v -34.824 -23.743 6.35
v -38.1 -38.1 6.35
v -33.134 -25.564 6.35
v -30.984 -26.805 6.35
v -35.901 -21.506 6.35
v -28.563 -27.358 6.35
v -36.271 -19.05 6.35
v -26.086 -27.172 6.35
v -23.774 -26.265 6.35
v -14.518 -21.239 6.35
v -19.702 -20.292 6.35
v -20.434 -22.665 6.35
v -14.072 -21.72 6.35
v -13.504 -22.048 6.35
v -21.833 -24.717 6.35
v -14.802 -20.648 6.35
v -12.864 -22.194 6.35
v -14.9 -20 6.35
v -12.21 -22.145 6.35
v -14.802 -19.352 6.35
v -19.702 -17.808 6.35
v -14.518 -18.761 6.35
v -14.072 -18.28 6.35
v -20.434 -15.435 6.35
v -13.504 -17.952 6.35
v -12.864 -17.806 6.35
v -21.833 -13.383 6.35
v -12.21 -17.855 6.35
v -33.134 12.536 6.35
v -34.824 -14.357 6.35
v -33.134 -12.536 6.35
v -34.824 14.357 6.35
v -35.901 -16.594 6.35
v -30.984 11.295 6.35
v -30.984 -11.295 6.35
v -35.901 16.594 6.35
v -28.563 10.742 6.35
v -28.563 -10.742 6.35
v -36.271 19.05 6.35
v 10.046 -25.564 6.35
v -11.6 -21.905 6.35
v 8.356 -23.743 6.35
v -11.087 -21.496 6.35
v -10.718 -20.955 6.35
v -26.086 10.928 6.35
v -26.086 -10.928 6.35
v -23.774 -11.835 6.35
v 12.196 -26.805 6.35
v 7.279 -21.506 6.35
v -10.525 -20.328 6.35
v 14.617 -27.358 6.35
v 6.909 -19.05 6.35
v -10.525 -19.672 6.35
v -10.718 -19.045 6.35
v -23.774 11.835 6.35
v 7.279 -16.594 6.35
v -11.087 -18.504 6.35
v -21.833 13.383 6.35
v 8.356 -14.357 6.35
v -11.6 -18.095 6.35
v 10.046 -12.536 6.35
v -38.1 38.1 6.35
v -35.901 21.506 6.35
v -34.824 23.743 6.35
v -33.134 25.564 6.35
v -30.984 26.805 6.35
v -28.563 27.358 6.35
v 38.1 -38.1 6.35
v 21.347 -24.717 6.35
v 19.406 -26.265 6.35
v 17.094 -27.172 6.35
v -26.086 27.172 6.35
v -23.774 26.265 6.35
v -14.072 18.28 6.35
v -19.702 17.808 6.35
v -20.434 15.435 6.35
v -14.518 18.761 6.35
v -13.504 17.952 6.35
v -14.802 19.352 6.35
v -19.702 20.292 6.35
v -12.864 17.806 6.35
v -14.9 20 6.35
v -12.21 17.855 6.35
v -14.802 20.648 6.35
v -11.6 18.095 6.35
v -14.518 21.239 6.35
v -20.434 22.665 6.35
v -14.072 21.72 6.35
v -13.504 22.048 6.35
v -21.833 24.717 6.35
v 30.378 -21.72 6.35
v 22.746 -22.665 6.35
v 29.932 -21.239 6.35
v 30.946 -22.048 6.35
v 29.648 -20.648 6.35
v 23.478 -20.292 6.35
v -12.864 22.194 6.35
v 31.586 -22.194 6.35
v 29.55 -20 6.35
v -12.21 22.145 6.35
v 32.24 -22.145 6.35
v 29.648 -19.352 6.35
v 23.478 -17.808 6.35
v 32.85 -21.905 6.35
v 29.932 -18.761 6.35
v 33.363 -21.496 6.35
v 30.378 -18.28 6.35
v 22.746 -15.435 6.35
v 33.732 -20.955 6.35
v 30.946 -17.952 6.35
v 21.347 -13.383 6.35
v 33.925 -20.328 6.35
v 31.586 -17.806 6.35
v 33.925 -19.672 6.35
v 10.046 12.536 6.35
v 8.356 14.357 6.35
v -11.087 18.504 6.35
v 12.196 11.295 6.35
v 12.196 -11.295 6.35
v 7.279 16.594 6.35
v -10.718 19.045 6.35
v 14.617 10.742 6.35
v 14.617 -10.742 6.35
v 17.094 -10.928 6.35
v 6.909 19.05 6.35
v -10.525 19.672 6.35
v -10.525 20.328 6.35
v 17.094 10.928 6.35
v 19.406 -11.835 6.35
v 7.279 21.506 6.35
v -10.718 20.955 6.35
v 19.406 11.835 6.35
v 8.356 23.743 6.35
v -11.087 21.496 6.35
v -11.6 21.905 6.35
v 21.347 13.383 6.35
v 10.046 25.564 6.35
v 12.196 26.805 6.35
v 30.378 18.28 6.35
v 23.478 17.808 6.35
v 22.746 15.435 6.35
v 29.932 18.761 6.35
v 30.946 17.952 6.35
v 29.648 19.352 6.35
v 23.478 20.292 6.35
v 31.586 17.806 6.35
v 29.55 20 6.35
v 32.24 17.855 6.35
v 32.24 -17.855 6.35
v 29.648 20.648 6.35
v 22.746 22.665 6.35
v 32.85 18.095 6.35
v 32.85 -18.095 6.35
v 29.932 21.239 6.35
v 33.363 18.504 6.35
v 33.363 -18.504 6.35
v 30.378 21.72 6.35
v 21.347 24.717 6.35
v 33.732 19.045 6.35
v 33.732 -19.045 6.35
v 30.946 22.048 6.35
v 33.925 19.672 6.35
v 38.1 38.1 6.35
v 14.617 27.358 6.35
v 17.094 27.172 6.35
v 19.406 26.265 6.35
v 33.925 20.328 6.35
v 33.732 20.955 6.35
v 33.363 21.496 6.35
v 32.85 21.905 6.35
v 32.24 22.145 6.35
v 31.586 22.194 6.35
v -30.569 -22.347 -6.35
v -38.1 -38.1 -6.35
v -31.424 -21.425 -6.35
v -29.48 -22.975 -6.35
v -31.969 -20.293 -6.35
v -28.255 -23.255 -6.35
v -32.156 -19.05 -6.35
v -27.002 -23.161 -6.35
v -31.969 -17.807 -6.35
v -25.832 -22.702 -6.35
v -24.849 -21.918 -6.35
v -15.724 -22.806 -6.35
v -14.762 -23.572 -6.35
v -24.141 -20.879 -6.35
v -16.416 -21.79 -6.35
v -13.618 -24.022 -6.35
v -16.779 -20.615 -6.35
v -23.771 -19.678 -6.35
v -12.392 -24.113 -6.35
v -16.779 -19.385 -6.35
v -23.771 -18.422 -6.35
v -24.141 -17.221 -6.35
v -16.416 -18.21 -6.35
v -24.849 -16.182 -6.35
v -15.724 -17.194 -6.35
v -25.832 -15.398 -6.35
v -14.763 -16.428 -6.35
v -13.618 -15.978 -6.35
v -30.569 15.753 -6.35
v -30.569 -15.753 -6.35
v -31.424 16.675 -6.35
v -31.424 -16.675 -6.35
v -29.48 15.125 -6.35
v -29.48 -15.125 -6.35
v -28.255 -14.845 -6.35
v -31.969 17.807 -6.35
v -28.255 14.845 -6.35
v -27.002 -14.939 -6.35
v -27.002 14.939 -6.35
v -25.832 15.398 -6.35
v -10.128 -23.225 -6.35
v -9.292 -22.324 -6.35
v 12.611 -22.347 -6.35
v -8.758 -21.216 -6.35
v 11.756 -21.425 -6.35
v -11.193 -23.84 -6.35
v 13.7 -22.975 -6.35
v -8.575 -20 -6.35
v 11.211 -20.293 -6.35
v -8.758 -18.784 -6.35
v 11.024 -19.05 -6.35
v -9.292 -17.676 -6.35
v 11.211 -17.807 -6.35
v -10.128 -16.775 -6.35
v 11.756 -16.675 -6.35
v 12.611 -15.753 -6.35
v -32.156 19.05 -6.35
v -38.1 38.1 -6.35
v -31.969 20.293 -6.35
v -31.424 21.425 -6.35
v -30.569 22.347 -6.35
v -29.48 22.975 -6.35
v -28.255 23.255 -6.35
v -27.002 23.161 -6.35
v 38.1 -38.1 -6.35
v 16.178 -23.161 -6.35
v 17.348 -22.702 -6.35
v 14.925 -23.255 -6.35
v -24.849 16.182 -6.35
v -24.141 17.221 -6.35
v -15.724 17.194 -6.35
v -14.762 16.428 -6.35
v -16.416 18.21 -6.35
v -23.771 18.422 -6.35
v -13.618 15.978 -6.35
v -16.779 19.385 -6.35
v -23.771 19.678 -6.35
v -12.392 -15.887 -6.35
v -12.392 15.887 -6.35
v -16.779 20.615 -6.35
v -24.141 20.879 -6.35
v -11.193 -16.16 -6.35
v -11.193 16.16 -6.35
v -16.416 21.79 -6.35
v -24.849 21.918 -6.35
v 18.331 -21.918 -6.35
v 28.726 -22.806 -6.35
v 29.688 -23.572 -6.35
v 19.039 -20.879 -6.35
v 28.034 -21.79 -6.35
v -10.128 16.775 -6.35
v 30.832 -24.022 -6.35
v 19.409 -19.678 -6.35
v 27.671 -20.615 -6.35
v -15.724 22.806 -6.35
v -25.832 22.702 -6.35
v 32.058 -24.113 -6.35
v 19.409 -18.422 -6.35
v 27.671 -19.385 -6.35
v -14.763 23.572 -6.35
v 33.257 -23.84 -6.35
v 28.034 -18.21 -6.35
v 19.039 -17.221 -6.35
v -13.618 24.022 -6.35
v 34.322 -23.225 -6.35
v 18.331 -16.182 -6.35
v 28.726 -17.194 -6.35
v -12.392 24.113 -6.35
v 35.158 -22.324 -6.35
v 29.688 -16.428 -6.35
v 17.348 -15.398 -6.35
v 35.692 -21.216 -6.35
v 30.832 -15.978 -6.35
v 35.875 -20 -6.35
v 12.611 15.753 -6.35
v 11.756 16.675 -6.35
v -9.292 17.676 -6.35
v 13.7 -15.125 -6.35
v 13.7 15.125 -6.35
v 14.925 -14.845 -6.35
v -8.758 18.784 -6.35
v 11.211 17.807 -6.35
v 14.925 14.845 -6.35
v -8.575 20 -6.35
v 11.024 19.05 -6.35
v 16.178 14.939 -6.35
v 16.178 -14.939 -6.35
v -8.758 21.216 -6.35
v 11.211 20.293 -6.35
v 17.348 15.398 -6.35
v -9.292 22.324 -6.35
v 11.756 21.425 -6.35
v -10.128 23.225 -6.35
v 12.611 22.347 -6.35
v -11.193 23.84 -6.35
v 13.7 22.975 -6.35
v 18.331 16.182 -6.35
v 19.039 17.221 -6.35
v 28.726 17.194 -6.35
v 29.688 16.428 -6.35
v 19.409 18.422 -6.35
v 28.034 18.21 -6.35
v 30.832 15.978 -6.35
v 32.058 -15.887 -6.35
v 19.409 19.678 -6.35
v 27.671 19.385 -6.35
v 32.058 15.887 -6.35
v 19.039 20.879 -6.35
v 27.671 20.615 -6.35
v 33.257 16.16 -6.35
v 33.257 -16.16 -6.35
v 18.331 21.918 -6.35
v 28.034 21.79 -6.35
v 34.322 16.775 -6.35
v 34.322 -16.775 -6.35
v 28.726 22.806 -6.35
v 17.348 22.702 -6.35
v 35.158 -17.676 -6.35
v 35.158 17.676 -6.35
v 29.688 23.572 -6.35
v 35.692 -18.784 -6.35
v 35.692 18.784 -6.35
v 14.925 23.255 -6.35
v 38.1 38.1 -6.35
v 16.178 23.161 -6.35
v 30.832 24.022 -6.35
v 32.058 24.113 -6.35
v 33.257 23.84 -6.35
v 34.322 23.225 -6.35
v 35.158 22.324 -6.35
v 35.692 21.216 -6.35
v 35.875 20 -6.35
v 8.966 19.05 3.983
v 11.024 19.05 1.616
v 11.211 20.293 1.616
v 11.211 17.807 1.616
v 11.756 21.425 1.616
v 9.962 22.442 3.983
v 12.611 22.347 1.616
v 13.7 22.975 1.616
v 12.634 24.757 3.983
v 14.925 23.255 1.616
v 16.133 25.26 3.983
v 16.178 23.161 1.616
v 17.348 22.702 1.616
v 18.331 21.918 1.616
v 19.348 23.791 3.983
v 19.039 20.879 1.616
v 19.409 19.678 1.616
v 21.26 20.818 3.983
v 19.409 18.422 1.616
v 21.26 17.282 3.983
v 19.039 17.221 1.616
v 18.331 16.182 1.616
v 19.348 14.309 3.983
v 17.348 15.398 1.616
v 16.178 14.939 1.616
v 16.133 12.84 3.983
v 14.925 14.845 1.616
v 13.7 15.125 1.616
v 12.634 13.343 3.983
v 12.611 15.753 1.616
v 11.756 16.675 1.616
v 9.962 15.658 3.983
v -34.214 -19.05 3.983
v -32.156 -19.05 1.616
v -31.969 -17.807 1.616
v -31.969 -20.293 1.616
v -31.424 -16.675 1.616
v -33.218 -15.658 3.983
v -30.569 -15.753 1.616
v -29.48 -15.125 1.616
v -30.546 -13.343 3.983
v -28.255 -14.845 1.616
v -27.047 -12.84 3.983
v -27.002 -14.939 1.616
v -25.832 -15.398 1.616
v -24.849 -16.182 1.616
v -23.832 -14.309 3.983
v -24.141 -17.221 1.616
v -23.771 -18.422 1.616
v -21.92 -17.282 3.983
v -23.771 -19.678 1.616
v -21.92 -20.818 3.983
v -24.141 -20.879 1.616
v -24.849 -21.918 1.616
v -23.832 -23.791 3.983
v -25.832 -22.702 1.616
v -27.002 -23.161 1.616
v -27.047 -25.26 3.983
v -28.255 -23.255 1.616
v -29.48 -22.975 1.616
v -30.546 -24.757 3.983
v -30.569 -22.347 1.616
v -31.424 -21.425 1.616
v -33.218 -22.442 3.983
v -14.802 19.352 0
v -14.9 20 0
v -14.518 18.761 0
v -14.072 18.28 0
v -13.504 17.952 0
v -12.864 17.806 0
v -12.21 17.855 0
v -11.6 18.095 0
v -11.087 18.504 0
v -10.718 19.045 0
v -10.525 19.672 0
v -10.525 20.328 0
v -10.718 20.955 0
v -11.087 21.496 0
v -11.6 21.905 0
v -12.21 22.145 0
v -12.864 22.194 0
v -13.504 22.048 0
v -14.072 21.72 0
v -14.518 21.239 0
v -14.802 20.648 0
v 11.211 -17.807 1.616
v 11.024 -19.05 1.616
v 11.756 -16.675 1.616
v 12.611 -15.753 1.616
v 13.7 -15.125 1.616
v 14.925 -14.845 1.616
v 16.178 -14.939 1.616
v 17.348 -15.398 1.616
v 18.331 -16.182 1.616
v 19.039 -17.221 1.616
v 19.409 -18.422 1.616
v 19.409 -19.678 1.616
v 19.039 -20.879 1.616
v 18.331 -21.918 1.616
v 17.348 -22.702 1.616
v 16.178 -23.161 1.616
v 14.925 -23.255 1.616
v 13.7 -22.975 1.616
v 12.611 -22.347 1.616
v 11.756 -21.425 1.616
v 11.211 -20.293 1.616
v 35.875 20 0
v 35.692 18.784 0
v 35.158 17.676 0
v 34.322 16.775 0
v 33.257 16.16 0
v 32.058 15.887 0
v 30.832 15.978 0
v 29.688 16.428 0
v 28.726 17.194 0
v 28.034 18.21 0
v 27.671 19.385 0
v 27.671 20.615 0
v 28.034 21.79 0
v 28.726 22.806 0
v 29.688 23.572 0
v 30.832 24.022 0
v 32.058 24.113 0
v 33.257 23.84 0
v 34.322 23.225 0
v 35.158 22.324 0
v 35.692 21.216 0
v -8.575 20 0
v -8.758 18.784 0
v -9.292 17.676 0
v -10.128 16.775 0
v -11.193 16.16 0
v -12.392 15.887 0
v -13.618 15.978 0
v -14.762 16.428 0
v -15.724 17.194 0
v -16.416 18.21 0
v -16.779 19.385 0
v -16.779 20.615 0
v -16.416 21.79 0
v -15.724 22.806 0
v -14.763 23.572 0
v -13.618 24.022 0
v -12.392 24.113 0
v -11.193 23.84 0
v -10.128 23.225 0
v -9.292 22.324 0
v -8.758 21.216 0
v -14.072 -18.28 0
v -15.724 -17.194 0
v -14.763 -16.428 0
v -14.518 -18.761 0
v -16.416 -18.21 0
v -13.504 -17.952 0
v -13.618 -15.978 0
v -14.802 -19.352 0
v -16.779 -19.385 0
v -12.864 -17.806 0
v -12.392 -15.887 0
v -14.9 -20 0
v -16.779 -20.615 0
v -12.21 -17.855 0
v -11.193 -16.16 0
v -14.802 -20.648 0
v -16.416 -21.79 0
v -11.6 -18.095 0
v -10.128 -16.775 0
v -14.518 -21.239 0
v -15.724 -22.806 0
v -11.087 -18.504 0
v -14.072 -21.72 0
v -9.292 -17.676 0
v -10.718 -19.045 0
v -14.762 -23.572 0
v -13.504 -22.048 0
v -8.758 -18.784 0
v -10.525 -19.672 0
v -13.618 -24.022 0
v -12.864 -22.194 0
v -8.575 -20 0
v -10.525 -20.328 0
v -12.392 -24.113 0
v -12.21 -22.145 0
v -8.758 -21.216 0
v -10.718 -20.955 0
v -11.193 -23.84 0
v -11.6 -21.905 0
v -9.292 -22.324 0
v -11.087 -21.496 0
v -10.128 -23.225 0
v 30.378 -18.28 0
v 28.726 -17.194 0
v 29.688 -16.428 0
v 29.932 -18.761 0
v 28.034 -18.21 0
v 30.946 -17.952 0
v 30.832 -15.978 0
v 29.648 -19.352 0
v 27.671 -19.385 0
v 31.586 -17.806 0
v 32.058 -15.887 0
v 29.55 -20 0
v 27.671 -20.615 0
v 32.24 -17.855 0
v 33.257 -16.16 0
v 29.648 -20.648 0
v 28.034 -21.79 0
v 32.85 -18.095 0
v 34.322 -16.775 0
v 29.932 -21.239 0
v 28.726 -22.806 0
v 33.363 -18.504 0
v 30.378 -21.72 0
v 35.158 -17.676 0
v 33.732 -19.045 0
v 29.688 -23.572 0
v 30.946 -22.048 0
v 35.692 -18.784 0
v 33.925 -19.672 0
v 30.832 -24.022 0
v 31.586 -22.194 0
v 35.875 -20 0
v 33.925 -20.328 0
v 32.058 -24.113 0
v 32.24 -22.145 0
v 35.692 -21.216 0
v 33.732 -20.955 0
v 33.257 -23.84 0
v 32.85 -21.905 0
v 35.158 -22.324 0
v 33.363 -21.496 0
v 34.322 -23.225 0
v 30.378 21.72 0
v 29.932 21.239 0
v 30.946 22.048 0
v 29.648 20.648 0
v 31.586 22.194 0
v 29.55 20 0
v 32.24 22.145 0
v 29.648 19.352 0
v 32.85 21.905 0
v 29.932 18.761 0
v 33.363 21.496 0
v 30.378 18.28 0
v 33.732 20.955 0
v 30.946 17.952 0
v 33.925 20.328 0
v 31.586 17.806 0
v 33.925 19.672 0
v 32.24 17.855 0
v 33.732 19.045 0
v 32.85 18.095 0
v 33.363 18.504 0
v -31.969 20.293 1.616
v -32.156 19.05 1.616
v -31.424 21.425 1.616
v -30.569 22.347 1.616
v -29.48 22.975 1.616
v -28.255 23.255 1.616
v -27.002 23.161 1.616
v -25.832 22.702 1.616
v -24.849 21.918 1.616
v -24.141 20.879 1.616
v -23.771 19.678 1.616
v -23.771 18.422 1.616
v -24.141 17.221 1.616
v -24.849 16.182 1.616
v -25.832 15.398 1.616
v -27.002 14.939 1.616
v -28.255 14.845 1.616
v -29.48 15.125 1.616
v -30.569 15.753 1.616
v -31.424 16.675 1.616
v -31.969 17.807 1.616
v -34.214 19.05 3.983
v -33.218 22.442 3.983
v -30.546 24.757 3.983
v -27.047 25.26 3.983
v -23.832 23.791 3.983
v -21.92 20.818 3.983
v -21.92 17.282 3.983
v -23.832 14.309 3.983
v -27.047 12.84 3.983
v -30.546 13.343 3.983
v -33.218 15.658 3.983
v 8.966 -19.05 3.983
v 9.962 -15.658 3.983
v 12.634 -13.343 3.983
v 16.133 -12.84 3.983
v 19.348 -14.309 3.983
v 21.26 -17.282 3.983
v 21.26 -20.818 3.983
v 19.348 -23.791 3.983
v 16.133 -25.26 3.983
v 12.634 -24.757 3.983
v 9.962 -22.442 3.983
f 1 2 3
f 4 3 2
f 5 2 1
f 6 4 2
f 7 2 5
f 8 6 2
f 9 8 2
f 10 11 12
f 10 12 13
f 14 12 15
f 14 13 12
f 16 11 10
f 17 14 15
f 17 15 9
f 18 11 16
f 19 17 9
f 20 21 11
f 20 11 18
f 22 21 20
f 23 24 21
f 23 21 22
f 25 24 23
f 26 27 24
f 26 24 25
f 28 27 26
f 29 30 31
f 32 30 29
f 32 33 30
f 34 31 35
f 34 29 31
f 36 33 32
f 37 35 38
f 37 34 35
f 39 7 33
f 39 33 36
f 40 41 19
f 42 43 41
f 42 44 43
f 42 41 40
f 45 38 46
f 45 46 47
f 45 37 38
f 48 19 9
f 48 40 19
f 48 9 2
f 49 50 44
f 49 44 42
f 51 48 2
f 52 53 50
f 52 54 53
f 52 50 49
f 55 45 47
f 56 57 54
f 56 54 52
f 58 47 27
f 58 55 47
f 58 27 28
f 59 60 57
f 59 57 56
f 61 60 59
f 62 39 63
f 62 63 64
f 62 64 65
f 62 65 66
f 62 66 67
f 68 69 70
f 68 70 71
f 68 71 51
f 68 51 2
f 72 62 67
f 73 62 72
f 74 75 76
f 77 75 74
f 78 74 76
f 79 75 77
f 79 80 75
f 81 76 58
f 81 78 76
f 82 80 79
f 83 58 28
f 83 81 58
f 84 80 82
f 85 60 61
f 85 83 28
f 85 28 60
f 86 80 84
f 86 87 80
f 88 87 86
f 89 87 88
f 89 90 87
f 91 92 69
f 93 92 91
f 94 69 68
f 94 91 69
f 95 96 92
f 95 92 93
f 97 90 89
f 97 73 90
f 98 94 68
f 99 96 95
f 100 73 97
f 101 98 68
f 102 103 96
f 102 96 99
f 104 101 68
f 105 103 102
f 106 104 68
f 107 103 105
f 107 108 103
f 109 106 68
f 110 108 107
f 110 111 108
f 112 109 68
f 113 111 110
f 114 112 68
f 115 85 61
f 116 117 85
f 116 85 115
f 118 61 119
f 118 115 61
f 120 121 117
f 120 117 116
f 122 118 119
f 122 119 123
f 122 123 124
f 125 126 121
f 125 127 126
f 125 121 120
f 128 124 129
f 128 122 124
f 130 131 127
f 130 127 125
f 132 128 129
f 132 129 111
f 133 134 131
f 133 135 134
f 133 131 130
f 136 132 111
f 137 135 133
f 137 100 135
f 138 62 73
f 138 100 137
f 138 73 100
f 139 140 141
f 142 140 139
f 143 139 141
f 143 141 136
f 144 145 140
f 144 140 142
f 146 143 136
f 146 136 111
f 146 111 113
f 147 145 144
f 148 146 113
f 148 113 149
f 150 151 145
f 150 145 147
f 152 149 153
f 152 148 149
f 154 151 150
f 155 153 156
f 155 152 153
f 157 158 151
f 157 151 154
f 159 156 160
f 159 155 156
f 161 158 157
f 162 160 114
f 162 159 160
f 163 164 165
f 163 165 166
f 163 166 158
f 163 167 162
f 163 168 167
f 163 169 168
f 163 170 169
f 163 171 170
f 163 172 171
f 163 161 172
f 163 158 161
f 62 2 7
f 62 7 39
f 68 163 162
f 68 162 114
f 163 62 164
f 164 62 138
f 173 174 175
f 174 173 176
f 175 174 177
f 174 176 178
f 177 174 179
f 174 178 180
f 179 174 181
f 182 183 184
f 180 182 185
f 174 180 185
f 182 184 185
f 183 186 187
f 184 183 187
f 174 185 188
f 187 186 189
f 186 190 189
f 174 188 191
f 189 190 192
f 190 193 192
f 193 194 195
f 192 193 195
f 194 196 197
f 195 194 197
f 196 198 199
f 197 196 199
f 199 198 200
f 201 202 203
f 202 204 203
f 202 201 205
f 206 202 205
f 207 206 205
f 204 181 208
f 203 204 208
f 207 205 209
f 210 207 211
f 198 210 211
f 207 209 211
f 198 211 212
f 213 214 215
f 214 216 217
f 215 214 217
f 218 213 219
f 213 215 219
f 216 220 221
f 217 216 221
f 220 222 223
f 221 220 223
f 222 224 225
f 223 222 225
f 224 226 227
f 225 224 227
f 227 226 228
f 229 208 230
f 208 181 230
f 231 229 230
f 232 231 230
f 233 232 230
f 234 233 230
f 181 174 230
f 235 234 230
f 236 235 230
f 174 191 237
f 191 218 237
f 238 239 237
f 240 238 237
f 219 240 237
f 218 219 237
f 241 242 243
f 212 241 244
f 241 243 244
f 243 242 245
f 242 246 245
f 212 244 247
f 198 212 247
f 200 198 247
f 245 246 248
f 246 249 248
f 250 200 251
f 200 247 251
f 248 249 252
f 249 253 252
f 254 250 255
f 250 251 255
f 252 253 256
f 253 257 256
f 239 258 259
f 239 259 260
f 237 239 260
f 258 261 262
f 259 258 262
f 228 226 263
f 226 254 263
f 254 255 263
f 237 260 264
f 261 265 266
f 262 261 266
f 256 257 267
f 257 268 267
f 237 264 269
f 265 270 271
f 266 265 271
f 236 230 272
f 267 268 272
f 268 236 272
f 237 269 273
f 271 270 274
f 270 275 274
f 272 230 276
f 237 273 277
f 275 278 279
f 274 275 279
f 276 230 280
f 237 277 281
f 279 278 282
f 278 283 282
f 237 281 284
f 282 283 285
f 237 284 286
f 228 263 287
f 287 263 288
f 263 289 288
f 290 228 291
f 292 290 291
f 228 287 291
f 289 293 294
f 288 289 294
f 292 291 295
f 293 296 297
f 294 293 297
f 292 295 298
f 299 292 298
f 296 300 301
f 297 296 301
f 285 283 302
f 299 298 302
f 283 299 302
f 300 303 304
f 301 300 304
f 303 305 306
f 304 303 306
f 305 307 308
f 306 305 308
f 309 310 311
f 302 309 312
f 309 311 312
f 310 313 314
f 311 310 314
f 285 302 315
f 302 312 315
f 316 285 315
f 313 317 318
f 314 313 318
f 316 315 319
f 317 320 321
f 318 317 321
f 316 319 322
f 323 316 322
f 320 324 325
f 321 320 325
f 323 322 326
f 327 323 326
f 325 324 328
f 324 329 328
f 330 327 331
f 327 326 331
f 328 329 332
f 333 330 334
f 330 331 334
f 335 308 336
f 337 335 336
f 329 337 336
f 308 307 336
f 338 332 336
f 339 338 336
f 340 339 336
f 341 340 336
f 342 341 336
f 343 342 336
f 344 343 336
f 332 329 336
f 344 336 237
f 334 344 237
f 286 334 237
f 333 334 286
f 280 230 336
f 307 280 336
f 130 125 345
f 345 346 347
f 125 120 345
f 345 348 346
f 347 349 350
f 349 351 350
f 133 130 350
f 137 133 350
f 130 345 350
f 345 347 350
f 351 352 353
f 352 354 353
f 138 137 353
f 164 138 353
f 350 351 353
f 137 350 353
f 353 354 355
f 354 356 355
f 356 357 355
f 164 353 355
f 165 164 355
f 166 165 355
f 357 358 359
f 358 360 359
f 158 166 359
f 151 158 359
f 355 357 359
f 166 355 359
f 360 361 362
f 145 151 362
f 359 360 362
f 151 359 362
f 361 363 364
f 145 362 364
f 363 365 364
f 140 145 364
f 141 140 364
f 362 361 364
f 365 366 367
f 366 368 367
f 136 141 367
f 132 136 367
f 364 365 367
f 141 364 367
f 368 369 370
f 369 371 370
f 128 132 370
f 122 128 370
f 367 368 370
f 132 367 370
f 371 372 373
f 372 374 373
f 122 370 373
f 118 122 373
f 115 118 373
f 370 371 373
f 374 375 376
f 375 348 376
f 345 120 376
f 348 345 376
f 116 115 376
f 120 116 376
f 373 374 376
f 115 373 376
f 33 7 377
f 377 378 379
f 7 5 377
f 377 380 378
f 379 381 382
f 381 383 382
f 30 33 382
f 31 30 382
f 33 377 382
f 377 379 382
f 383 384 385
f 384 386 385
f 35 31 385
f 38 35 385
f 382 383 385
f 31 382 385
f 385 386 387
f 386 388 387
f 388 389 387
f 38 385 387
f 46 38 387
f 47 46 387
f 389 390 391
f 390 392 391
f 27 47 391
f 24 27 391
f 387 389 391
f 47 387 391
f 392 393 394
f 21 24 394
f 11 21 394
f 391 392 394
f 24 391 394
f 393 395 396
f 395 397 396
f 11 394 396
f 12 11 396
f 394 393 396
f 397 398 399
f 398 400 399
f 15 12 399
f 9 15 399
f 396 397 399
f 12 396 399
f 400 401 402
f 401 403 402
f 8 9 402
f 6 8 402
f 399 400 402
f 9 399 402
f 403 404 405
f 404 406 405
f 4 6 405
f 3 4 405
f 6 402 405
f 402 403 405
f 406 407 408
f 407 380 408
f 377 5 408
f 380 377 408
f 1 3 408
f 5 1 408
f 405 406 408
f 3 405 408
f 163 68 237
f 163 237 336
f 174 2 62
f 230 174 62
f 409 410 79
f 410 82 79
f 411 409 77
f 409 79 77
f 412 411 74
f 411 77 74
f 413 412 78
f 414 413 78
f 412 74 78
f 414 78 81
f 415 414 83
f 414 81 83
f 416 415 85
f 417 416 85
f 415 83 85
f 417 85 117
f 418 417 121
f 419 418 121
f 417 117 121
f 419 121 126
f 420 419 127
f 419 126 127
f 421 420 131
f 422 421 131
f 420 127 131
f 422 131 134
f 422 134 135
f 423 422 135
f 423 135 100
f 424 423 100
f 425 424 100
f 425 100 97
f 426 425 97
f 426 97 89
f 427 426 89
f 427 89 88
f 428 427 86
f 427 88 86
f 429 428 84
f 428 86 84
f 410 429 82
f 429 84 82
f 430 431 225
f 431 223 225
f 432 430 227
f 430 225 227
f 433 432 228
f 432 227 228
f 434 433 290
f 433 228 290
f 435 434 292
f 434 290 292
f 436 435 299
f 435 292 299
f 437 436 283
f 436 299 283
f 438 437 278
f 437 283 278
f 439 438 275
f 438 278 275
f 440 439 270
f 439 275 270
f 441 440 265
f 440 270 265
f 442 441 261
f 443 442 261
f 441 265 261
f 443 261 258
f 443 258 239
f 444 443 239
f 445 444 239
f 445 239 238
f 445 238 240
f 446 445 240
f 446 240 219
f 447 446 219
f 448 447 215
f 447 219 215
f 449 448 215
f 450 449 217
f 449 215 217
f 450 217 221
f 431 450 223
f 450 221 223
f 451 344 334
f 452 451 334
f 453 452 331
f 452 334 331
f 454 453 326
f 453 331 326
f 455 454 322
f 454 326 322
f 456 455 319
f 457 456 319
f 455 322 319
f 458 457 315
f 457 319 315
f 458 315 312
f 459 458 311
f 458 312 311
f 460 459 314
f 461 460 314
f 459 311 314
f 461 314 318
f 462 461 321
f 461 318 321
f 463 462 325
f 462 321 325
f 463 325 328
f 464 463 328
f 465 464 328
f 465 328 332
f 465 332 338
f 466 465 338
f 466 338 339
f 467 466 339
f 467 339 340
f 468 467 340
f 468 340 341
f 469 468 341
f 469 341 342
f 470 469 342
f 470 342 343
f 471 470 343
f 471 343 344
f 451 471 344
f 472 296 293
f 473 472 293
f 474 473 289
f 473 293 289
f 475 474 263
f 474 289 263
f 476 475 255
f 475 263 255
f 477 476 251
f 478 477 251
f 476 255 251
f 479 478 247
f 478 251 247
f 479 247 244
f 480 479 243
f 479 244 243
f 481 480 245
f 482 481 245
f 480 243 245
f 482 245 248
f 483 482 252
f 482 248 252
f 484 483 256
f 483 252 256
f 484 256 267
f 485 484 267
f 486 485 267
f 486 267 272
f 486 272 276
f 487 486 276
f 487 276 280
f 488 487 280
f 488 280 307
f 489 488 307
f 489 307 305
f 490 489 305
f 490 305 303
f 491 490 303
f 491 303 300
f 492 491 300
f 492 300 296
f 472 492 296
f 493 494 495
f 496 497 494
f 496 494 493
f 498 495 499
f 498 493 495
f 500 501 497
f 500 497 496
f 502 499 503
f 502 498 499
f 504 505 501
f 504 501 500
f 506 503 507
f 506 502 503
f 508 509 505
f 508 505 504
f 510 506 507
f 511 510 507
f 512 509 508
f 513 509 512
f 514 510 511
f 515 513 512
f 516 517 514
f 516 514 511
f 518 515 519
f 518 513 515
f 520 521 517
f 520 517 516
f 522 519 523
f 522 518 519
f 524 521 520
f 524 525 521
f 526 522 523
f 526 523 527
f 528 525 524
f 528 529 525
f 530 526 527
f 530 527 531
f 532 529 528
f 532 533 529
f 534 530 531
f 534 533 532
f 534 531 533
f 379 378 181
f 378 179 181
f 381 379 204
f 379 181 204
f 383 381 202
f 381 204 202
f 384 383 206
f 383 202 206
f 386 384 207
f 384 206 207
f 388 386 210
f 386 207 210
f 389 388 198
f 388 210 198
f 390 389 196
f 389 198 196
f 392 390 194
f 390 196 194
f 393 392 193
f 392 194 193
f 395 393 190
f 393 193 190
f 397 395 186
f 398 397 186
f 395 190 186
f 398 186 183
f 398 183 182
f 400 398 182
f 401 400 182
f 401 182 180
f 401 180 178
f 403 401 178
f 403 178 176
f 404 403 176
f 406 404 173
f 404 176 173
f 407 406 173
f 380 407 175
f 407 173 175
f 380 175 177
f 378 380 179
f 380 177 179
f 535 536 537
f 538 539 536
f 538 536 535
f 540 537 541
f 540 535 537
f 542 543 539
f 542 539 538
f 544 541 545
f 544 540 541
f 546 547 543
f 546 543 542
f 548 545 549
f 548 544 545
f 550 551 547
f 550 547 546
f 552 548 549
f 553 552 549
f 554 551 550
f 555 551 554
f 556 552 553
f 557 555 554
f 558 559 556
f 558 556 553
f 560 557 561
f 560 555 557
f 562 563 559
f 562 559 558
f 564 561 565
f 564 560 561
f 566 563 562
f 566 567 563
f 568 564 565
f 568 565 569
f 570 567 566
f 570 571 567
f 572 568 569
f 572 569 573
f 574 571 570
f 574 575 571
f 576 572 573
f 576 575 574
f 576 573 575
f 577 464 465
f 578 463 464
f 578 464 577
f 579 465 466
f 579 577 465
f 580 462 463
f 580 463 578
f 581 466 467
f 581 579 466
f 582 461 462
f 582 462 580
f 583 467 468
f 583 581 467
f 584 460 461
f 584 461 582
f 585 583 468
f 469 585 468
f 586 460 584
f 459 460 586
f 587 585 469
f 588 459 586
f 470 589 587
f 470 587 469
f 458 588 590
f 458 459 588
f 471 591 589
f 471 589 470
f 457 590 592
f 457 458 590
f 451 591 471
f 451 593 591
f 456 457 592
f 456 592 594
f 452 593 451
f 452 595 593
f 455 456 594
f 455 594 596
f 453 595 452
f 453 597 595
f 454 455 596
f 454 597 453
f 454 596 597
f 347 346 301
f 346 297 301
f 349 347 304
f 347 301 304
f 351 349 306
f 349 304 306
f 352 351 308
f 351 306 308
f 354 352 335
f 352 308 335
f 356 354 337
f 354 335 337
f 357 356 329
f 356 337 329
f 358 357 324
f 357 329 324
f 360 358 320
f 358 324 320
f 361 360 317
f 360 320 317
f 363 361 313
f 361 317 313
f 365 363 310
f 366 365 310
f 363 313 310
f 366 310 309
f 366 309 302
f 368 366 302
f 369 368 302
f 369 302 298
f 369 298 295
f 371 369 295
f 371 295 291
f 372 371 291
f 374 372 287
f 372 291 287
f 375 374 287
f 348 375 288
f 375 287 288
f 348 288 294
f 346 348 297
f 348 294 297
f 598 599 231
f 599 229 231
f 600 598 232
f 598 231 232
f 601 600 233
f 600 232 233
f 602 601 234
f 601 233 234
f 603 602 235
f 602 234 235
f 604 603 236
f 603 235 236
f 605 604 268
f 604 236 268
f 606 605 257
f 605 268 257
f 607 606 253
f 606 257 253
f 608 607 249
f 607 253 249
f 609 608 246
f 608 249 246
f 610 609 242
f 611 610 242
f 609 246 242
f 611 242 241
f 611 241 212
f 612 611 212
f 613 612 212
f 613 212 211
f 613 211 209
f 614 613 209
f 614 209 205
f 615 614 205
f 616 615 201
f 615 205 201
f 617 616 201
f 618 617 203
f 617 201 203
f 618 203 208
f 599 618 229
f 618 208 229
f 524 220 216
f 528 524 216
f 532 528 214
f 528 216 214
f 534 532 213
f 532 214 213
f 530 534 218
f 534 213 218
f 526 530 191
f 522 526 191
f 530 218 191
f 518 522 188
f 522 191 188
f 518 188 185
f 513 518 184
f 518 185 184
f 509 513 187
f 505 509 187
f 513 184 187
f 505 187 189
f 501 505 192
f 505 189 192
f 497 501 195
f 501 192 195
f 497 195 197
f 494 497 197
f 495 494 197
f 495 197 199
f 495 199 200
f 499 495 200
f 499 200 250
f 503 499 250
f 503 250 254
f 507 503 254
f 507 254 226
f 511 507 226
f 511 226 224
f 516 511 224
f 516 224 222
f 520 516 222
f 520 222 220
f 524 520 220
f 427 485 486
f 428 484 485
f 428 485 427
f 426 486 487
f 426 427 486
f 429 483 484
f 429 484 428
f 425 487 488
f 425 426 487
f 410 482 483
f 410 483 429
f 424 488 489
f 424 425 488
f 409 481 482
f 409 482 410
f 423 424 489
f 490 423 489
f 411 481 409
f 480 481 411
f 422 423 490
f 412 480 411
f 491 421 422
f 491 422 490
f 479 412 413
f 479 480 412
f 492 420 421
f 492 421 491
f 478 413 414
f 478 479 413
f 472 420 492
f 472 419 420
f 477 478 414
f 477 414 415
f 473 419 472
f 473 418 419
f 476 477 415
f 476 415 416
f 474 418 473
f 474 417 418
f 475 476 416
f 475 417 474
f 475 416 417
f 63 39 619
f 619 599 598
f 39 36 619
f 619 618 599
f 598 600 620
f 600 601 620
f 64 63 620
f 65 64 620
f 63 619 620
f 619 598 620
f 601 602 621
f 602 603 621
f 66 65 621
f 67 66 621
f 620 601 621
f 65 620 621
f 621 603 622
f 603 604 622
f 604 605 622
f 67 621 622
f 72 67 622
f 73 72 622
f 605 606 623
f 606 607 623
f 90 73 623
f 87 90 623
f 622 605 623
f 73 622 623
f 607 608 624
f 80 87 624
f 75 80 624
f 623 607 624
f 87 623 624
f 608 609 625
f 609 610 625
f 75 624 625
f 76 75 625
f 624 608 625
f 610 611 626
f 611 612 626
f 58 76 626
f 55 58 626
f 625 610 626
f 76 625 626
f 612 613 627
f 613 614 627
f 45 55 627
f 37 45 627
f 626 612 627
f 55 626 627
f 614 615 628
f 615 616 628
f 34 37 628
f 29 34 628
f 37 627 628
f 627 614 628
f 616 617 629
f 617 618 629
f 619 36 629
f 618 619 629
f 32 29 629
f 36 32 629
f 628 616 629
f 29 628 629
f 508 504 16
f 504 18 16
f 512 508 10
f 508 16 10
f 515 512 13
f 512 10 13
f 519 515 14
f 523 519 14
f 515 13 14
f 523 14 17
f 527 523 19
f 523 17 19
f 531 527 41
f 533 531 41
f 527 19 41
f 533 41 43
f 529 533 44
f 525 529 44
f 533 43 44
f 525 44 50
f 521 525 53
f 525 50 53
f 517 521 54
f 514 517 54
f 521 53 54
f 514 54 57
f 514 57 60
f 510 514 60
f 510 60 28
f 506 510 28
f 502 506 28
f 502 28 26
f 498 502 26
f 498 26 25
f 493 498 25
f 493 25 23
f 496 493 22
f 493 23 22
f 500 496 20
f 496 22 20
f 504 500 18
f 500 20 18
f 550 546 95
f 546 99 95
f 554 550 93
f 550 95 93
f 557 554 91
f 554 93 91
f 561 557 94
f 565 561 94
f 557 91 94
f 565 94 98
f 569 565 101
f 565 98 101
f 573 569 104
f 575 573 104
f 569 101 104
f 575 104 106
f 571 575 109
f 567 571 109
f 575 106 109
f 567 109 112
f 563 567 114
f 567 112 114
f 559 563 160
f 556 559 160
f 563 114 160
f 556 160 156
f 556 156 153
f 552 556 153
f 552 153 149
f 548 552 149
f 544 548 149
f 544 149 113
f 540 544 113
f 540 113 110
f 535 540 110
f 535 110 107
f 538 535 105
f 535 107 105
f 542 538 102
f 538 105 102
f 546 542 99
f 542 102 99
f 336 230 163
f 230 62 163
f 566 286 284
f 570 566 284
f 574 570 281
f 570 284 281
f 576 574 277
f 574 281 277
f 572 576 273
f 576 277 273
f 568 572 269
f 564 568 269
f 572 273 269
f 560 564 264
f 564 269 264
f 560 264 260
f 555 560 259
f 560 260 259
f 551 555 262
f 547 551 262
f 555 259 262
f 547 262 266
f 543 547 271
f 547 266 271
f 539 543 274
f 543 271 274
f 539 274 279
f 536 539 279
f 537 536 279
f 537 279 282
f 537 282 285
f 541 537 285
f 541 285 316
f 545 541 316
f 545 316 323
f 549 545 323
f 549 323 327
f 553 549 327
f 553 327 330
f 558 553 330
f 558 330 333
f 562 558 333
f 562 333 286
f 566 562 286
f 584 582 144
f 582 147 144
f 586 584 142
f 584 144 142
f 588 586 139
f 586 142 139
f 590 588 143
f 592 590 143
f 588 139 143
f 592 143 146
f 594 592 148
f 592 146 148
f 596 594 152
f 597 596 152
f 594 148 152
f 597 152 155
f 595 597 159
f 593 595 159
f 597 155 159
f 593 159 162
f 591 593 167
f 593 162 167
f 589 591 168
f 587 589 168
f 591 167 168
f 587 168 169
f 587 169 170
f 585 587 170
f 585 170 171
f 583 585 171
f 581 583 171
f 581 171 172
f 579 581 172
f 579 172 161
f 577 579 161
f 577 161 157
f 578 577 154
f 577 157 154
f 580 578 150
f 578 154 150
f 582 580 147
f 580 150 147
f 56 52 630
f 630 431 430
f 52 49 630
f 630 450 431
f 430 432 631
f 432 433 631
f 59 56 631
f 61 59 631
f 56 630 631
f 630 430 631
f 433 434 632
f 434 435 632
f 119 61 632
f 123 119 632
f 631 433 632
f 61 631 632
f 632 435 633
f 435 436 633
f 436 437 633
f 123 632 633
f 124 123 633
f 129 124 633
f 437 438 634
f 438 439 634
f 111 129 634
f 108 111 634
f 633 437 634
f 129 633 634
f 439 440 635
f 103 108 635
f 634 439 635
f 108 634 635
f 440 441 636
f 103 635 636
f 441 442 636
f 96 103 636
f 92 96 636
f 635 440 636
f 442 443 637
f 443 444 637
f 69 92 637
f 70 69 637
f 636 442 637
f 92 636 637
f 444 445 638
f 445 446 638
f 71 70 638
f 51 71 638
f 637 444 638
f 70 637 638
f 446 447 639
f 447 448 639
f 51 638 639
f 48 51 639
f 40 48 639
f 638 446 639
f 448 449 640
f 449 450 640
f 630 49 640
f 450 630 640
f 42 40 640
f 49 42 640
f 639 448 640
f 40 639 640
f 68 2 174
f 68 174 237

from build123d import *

# Parameters (mm, degrees)
F0_W           = 76.2
F0_H           = 76.2
F1_DEPTH       = 6.35
F3_D           = 8.4328
F3_CSINK_D     = 16.6624
F3_CSINK_ANGLE = 82
F5_D           = 4.4
F5_CBORE_D     = 8.25
F5_CBORE_DEPTH = 6.35


with BuildPart() as f1:
    # F0 (on Top) → F1 (new body, symmetric)
    with BuildSketch(Plane.XY):
        Rectangle(F0_W, F0_H)
    extrude(amount=F1_DEPTH, both=True)

    # F3 (through all)
    with Locations(Plane.XY.offset(6.35)):
        with Locations((-27.94, 19.05), (15.24, 19.05), (15.24, -19.05), (-27.94, -19.05)):
            CounterSinkHole(F3_D / 2, F3_CSINK_D / 2, counter_sink_angle=F3_CSINK_ANGLE)

    # F5 (through all)
    with Locations(Plane(origin=(0, 0, -6.35), x_dir=(1, 0, 0), z_dir=(0, 0, -1))):
        with Locations((-12.7, 20), (31.75, 20), (31.75, -20), (-12.7, -20)):
            CounterBoreHole(F5_D / 2, F5_CBORE_D / 2, F5_CBORE_DEPTH)


solid = f1.part
